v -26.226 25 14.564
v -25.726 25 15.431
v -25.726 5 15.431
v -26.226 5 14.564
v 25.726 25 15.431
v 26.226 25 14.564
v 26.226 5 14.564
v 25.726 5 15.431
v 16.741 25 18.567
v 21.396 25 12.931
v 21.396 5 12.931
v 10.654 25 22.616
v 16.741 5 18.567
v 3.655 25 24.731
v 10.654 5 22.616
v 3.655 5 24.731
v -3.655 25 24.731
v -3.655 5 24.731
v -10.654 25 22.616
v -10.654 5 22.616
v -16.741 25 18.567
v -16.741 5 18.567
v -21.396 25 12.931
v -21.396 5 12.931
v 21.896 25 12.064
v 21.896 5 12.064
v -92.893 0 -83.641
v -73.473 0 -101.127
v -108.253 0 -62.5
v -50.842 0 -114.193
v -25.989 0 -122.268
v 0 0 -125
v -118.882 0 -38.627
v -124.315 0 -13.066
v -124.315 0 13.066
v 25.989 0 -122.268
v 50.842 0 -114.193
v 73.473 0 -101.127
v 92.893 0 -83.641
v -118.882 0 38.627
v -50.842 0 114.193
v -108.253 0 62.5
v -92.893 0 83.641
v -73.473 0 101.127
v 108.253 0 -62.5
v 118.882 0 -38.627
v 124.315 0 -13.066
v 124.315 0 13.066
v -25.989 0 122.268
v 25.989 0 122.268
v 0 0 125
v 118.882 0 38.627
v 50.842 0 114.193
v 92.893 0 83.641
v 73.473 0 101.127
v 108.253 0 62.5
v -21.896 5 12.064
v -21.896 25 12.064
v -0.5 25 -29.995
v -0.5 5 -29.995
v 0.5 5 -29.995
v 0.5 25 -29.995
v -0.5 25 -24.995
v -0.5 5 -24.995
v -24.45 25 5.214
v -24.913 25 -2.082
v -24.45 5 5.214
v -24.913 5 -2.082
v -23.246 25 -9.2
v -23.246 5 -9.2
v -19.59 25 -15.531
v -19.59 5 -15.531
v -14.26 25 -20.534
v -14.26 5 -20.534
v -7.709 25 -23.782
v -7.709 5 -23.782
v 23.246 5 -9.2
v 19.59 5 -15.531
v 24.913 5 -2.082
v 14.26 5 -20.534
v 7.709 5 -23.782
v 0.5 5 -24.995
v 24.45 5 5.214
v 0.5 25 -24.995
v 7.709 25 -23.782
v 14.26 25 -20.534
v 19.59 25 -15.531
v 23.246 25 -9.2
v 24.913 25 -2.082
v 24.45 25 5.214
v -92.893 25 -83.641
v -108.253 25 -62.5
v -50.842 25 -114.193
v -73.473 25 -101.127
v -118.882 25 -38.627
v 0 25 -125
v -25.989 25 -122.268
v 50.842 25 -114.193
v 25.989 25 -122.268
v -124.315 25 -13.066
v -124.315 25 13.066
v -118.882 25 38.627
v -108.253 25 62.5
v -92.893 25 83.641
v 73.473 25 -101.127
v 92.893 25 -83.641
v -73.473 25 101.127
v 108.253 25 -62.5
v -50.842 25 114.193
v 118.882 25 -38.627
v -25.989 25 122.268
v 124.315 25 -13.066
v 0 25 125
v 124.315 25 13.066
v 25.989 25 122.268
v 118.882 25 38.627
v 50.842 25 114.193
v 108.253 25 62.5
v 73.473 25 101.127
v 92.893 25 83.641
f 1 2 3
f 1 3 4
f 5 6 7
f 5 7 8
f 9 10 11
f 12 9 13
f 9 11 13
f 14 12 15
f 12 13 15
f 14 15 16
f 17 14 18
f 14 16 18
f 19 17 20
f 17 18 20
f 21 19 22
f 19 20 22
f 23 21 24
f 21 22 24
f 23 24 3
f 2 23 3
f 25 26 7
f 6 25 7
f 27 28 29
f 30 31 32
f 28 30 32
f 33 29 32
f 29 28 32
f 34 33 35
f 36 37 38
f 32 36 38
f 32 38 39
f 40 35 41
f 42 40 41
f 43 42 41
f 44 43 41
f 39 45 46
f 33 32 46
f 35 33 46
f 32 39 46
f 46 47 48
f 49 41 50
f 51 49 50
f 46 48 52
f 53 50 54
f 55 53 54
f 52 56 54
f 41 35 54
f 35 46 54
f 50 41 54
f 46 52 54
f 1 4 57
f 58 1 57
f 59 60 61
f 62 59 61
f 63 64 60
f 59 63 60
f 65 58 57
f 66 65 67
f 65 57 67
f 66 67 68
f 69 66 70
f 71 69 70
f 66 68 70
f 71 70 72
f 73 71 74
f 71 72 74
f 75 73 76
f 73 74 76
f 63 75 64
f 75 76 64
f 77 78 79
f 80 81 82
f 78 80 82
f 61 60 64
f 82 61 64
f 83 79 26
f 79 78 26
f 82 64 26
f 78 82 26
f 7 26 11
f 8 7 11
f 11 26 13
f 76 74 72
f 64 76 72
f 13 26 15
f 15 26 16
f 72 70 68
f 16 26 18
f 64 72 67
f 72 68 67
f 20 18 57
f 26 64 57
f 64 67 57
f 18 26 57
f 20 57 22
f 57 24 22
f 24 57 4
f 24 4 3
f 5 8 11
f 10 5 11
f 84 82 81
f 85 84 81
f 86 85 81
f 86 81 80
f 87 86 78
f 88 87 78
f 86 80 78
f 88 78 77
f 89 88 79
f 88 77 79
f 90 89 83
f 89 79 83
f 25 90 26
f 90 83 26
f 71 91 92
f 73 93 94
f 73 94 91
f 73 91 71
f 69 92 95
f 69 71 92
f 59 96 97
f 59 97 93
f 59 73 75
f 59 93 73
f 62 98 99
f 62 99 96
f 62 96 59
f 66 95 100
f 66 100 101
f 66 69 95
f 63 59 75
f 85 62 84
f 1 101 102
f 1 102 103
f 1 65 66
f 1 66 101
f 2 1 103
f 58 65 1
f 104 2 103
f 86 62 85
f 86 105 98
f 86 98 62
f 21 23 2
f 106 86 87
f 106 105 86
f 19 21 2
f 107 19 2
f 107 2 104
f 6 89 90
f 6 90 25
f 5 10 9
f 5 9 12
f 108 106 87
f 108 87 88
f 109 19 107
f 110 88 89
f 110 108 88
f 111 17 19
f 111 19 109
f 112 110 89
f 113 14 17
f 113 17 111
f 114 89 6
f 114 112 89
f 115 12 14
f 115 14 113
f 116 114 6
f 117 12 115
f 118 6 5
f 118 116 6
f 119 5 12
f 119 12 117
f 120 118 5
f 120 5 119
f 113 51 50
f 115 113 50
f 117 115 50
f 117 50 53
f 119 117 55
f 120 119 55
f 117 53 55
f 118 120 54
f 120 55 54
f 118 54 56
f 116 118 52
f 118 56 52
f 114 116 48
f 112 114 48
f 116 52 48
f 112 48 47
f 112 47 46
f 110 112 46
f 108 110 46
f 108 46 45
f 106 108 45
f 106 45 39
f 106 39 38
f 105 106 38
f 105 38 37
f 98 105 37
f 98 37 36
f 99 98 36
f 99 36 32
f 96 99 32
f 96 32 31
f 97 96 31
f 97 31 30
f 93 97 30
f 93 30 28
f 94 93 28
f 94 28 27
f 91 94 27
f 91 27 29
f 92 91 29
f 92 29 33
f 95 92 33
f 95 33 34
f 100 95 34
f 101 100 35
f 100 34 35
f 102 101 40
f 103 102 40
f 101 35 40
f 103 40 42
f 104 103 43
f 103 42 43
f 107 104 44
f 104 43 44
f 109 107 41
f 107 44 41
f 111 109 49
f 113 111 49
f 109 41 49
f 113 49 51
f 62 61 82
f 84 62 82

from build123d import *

# Parameters (mm, degrees)
SKETCH_2_R      = 125
EXTRUDE_1_DEPTH = 25
SKETCH_3_R      = 125
EXTRUDE_2_DEPTH = 5


with BuildPart() as part:
    # 草圖2 → 填料-伸長1 (new body)
    with BuildSketch(Plane(origin=(0, 0, 0), x_dir=(1, 0, 0), z_dir=(0, 1, 0))):
        with Locations(Location((0, 0, 0), (0, 0, 270))):
            Circle(SKETCH_2_R)
        with BuildLine():
            Line((26.226431553, -14.564487048), (25.726431553, -15.430512452))
            Line((25.726431553, -15.430512452), (21.396304534, -12.930512452))
            ThreePointArc((21.396304534, -12.930512452), (0, -25), (-21.396304534, -12.930512452))
            Line((-21.396304534, -12.930512452), (-25.726431553, -15.430512452))
            Line((-25.726431553, -15.430512452), (-26.226431553, -14.564487048))
            Line((-26.226431553, -14.564487048), (-21.896304534, -12.064487048))
            ThreePointArc((-21.896304534, -12.064487048), (-21.650635095, 12.5), (-0.5, 24.9949995))
            Line((-0.5, 24.9949995), (-0.5, 29.9949995))
            Line((-0.5, 29.9949995), (0.5, 29.9949995))
            Line((0.5, 29.9949995), (0.5, 24.9949995))
            ThreePointArc((0.5, 24.9949995), (21.650635095, 12.5), (21.896304534, -12.064487048))
            Line((21.896304534, -12.064487048), (26.226431553, -14.564487048))
        make_face(mode=Mode.SUBTRACT)
    extrude(amount=EXTRUDE_1_DEPTH)

    # 草圖3 → 填料-伸長2 (add)
    with BuildSketch(Plane.XZ):
        with Locations(Location((0, 0, 0), (0, 0, 90))):
            Circle(SKETCH_3_R)
    extrude(amount=-EXTRUDE_2_DEPTH)


solid = part.part
